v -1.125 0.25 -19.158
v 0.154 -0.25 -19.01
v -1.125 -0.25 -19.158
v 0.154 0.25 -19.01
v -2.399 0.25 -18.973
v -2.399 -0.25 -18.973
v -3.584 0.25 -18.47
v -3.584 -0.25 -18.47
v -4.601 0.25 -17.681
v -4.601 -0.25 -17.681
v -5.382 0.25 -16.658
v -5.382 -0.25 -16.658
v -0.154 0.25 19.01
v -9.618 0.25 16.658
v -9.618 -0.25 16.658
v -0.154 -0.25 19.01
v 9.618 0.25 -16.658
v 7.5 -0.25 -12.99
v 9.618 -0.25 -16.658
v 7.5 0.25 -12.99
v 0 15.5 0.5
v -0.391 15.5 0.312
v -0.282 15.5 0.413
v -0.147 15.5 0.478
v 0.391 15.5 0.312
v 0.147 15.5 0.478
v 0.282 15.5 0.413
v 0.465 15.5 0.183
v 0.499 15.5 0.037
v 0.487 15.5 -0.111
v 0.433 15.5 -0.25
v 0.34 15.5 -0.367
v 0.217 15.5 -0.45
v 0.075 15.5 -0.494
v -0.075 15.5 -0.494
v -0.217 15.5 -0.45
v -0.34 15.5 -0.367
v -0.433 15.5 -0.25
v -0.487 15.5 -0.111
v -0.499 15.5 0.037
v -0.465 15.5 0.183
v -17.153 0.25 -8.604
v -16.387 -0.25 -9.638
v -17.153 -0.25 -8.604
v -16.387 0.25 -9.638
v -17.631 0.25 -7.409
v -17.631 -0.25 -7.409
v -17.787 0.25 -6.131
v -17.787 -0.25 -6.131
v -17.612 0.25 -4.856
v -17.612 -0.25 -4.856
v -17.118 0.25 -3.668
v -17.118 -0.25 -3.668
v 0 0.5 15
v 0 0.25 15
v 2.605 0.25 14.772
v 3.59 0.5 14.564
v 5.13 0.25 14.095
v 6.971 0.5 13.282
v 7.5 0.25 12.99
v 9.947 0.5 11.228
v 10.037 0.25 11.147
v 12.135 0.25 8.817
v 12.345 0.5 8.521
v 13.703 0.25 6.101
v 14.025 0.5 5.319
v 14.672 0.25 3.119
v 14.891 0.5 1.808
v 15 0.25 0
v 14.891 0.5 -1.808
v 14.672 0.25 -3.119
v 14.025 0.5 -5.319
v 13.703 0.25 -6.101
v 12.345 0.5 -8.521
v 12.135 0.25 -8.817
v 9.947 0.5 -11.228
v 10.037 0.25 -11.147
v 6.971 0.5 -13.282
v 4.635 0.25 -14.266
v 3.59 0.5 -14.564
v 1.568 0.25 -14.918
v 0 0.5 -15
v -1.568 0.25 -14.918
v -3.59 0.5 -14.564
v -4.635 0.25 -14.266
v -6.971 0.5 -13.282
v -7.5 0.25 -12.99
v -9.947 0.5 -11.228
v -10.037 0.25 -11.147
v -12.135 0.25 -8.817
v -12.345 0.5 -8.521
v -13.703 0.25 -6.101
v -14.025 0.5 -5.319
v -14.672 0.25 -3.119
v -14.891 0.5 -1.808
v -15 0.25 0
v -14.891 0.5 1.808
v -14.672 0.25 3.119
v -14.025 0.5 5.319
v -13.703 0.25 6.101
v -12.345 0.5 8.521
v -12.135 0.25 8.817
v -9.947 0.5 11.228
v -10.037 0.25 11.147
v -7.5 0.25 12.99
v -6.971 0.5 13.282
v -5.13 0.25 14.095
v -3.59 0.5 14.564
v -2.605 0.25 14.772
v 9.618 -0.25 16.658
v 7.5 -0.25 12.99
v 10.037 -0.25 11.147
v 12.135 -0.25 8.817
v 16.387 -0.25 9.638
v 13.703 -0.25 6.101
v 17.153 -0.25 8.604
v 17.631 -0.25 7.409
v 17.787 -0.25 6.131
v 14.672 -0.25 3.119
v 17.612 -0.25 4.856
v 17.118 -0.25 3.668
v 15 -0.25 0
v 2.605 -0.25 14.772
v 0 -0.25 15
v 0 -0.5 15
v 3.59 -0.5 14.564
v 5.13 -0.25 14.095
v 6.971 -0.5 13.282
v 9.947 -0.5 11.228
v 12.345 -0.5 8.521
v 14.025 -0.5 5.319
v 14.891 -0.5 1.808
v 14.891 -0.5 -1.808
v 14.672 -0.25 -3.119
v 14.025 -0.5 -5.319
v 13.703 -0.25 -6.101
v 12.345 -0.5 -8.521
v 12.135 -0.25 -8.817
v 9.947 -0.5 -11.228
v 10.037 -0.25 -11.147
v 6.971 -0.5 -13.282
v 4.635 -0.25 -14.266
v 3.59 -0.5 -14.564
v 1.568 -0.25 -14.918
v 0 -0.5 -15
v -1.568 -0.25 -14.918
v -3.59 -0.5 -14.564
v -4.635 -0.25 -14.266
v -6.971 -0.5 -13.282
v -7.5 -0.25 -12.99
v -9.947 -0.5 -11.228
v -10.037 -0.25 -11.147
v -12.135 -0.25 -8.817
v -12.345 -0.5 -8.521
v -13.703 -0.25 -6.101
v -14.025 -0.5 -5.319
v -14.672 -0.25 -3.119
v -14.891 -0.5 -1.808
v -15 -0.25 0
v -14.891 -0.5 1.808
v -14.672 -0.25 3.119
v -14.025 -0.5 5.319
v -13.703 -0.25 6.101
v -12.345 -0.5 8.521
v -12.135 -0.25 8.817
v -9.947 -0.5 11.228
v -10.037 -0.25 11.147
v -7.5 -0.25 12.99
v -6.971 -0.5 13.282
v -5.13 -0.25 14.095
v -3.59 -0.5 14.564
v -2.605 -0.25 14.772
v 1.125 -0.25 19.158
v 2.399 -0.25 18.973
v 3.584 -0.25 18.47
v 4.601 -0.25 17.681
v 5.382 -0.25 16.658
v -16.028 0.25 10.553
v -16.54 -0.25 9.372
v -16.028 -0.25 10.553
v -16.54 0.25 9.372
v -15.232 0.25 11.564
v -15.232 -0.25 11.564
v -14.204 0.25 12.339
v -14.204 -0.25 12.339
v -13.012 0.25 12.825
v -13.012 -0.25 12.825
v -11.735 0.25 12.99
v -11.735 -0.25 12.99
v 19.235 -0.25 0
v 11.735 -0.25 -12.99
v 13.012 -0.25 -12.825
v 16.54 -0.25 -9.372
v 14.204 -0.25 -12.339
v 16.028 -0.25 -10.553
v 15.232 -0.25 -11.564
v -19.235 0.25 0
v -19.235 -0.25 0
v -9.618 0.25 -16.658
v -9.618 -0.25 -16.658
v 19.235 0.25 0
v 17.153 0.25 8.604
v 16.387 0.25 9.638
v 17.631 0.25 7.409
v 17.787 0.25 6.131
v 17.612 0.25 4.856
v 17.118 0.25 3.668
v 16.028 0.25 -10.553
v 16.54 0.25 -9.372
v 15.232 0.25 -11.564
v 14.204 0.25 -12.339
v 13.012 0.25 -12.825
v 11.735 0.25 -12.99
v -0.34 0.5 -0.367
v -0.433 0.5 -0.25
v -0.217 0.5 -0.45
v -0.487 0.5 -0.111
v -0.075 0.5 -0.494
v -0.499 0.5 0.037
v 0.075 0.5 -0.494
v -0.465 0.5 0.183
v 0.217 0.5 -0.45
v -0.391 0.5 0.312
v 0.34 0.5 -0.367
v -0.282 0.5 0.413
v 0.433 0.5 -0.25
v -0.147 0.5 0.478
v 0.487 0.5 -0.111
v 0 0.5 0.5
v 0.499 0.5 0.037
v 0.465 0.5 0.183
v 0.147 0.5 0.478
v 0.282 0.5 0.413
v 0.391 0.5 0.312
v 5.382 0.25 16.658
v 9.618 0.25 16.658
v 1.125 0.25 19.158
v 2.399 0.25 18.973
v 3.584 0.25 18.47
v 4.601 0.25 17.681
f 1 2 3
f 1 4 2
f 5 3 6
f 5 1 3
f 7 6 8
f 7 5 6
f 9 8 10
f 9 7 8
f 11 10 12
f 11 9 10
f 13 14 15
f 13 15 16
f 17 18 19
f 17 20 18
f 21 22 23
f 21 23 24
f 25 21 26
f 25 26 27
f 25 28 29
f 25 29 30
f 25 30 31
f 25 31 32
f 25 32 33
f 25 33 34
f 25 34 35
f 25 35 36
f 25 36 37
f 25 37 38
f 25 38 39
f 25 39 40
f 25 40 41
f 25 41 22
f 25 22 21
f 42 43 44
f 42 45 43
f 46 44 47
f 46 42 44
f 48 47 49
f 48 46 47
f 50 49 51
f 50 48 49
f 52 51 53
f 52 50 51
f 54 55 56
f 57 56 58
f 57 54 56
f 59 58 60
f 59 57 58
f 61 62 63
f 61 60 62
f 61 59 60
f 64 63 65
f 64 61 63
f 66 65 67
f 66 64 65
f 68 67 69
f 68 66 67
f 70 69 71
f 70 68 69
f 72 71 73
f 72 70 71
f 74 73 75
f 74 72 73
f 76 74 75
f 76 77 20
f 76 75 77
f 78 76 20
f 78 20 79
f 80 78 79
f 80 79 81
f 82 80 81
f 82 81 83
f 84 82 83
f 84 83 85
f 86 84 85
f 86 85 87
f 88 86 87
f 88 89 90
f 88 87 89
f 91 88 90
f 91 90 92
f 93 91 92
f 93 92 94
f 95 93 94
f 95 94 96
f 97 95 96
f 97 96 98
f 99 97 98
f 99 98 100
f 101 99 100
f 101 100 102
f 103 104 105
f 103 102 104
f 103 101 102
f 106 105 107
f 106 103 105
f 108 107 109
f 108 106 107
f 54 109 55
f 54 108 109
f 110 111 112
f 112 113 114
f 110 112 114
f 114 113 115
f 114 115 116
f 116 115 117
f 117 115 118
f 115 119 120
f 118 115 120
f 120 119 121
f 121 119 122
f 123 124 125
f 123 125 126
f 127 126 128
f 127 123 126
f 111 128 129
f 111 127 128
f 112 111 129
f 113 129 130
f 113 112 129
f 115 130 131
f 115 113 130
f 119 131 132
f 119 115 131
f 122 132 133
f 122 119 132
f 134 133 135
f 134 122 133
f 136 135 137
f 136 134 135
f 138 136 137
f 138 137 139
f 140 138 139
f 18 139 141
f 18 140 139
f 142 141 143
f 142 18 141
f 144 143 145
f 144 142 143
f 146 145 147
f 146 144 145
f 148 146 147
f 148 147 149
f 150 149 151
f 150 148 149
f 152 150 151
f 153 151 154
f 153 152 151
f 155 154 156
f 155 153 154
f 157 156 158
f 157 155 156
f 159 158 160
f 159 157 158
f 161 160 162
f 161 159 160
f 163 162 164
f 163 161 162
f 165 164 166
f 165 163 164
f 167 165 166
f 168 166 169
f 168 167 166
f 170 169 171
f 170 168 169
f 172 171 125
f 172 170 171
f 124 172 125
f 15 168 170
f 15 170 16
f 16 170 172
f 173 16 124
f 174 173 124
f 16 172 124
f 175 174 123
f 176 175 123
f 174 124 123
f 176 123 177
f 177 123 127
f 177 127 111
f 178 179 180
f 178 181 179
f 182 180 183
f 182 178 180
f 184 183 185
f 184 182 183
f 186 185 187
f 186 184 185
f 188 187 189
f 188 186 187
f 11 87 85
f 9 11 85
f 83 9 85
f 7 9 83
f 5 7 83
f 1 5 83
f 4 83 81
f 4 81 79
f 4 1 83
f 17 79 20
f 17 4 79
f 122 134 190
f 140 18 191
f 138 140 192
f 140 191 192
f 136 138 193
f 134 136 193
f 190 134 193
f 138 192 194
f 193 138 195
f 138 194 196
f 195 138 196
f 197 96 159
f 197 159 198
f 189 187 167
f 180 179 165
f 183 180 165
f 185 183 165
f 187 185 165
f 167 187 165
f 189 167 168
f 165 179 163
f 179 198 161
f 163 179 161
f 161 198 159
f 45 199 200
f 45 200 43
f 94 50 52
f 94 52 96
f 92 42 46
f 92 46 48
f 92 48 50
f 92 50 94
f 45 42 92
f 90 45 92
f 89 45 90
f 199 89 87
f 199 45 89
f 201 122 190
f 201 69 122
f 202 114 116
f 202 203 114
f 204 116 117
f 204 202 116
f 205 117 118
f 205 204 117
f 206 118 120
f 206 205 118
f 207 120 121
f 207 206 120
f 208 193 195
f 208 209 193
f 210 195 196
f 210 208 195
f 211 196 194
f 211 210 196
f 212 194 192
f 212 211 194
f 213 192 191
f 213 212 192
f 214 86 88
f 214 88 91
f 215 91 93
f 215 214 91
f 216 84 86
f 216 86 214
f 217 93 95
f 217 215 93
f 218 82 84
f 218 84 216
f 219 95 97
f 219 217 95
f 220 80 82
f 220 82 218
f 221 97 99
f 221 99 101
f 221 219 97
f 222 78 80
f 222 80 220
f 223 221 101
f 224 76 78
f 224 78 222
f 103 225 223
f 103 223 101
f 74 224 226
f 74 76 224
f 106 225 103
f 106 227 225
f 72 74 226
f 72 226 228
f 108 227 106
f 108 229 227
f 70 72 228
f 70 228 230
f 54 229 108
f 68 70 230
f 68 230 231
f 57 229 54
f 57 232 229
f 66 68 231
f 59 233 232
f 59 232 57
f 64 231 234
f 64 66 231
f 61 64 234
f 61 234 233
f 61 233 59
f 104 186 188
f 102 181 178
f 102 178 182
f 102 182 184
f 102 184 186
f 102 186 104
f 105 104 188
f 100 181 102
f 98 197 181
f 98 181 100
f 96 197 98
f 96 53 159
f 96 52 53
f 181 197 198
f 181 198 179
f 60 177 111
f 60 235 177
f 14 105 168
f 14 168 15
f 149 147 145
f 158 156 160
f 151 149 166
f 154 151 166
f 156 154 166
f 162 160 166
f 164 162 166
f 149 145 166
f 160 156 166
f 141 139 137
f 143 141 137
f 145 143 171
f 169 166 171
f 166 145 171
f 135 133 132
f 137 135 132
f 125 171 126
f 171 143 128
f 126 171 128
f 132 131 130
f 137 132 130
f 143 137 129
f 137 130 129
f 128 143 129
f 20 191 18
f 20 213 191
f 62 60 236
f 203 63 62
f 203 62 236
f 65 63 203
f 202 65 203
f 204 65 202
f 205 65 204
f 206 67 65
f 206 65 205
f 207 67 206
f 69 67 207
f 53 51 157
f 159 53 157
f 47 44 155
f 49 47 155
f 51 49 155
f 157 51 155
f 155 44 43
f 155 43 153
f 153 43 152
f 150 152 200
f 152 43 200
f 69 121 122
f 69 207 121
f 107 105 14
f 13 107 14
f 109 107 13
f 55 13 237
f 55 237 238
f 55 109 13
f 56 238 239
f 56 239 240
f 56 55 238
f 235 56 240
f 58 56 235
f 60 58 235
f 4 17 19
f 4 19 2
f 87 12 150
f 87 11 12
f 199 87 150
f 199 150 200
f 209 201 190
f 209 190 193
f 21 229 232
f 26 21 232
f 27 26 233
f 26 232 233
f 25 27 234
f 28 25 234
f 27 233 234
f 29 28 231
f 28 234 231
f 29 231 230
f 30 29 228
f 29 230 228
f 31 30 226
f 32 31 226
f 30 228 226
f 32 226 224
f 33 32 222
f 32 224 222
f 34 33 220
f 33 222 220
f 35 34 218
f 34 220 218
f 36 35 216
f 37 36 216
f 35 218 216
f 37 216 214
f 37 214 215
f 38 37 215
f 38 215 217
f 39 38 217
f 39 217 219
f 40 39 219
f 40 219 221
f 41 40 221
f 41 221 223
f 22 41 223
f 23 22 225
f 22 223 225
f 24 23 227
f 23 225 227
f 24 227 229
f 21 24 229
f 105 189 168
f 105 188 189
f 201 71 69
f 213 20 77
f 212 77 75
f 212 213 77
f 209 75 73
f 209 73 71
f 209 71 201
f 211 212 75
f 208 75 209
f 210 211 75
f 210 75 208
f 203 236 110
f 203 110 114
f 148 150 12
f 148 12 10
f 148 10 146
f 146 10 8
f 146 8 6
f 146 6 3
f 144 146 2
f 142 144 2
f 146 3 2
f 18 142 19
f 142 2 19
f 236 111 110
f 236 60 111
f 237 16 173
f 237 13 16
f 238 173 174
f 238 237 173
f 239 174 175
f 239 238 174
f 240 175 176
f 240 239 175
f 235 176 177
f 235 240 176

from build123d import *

# Parameters (mm, degrees)
BOSS_EXTRUDE1_DEPTH = 0.5
BOSS_EXTRUDE3_DEPTH = 0.25
SKETCH2_R           = 0.5
BOSS_EXTRUDE4_DEPTH = 15


with BuildPart() as part:
    # Sketch1 → Boss-Extrude1 (new, symmetric)
    with BuildSketch(Plane(origin=(0, 0, 0), x_dir=(1, 0, 0), z_dir=(0, 1, 0))):
        with BuildLine():
            ThreePointArc((7.500000000000017, 12.990381056766571), (5.088e-14, 15), (-7.499999999999927, 12.990381056766621))
            ThreePointArc((-7.499999999999927, 12.990381056766621), (-12.990381056766557, 7.50000000000004), (-15, 1.84e-15))
            ThreePointArc((-15, 1.84e-15), (-12.990381056766612, -7.499999999999944), (-7.50000000000011, -12.990381056766516))
            ThreePointArc((-7.50000000000011, -12.990381056766516), (-1.0934e-13, -15), (7.49999999999992, -12.990381056766626))
            ThreePointArc((7.49999999999992, -12.990381056766626), (12.990381056766555, -7.500000000000042), (15, -3.67e-15))
            ThreePointArc((15, 0), (12.990381056766584, 7.499999999999992), (7.500000000000017, 12.990381056766571))
        make_face()
    extrude(amount=BOSS_EXTRUDE1_DEPTH, both=True)

    # Sketch1<3> → Boss-Extrude3 (add, symmetric)
    with BuildSketch(Plane(origin=(0, 0, 0), x_dir=(1, 0, 0), z_dir=(0, 1, 0))):
        with BuildLine():
            ThreePointArc((-15, 1.84e-15), (-12.990381056766557, 7.50000000000004), (-7.499999999999927, 12.990381056766621))
            Line((-7.499999999999832, 12.990381056766678), (-9.617524600200108, 16.658041250590582))
            Line((-9.617524600200108, 16.658041250590582), (-16.3865947350982, 9.638363270713926))
            ThreePointArc((-16.3865947350982, 9.638363270713926), (-17.750347235183938, 6.775221493443607), (-17.117524600200266, 3.6676601938240703))
            Line((-17.117524600200266, 3.6676601938240703), (-14.999999999999993, 1.6046e-13))
        make_face()
        with BuildLine():
            Line((-5.3824753997997234, 16.65804125059047), (-7.500000000000018, 12.99038105676657))
            ThreePointArc((-7.499999999999927, 12.990381056766621), (5.088e-14, 15), (7.500000000000017, 12.990381056766571))
            Line((7.500000000000018, 12.99038105676657), (9.617524600200294, 16.658041250590472))
            Line((9.617524600200294, 16.658041250590472), (0.15377007579180893, 19.010388957472337))
            ThreePointArc((0.15377007579180857, 19.010388957472337), (-3.0076596880036788, 18.75986237838593), (-5.3824753997997234, 16.65804125059047))
        make_face()
        with BuildLine():
            Line((11.735049200400615, 12.99038105676657), (7.500000000000014, 12.990381056766573))
            ThreePointArc((7.500000000000017, 12.990381056766571), (12.990381056766584, 7.499999999999992), (15, 0))
            Line((15.000000000000002, -5.551e-14), (19.235049200400596, -4.163e-14))
            Line((19.235049200400596, -4.086e-14), (16.540364810890143, 9.372025686758565))
            ThreePointArc((16.540364810890143, 9.372025686758565), (14.742687547180363, 11.984640884942497), (11.735049200400615, 12.99038105676657))
        make_face()
        with BuildLine():
            ThreePointArc((-7.50000000000011, -12.990381056766516), (-12.990381056766612, -7.499999999999944), (-15, 1.84e-15))
            Line((-14.999999999999993, 1.6046e-13), (-19.23504920040059, 1.7521e-13))
            Line((-19.23504920040059, 1.7586e-13), (-16.5403648108902, -9.37202568675845))
            ThreePointArc((-16.5403648108902, -9.37202568675845), (-14.742687547180438, -11.984640884942392), (-11.735049200400697, -12.990381056766488))
            Line((-11.735049200400697, -12.990381056766488), (-7.500000000000109, -12.990381056766518))
        make_face()
        with BuildLine():
            Line((17.117524600200298, -3.6676601938239486), (15.000000000000002, -5.551e-14))
            ThreePointArc((15, -3.67e-15), (12.990381056766555, -7.500000000000042), (7.49999999999992, -12.990381056766626))
            Line((7.499999999999927, -12.990381056766628), (9.617524600200229, -16.65804125059051))
            Line((9.617524600200229, -16.65804125059051), (16.38659473509827, -9.638363270713809))
            ThreePointArc((16.38659473509827, -9.638363270713809), (17.75034723518399, -6.775221493443482), (17.117524600200298, -3.6676601938239486))
        make_face()
        with BuildLine():
            ThreePointArc((7.49999999999992, -12.990381056766626), (-1.0934e-13, -15), (-7.50000000000011, -12.990381056766516))
            Line((-7.500000000000109, -12.990381056766518), (-9.617524600200412, -16.658041250590404))
            Line((-9.617524600200412, -16.658041250590404), (-0.15377007579194168, -19.010388957472337))
            ThreePointArc((-0.15377007579194157, -19.010388957472337), (3.007659688003548, -18.759862378385947), (5.382475399799607, -16.658041250590504))
            Line((5.382475399799607, -16.658041250590504), (7.499999999999927, -12.990381056766628))
        make_face()
    extrude(amount=BOSS_EXTRUDE3_DEPTH, both=True)

    # Sketch2 → Boss-Extrude4 (add)
    with BuildSketch(Plane(origin=(0, 0.5, 0), x_dir=(1, 0, 0), z_dir=(0, 1, 0))):
        Circle(SKETCH2_R)
    extrude(amount=BOSS_EXTRUDE4_DEPTH)


solid = part.part
